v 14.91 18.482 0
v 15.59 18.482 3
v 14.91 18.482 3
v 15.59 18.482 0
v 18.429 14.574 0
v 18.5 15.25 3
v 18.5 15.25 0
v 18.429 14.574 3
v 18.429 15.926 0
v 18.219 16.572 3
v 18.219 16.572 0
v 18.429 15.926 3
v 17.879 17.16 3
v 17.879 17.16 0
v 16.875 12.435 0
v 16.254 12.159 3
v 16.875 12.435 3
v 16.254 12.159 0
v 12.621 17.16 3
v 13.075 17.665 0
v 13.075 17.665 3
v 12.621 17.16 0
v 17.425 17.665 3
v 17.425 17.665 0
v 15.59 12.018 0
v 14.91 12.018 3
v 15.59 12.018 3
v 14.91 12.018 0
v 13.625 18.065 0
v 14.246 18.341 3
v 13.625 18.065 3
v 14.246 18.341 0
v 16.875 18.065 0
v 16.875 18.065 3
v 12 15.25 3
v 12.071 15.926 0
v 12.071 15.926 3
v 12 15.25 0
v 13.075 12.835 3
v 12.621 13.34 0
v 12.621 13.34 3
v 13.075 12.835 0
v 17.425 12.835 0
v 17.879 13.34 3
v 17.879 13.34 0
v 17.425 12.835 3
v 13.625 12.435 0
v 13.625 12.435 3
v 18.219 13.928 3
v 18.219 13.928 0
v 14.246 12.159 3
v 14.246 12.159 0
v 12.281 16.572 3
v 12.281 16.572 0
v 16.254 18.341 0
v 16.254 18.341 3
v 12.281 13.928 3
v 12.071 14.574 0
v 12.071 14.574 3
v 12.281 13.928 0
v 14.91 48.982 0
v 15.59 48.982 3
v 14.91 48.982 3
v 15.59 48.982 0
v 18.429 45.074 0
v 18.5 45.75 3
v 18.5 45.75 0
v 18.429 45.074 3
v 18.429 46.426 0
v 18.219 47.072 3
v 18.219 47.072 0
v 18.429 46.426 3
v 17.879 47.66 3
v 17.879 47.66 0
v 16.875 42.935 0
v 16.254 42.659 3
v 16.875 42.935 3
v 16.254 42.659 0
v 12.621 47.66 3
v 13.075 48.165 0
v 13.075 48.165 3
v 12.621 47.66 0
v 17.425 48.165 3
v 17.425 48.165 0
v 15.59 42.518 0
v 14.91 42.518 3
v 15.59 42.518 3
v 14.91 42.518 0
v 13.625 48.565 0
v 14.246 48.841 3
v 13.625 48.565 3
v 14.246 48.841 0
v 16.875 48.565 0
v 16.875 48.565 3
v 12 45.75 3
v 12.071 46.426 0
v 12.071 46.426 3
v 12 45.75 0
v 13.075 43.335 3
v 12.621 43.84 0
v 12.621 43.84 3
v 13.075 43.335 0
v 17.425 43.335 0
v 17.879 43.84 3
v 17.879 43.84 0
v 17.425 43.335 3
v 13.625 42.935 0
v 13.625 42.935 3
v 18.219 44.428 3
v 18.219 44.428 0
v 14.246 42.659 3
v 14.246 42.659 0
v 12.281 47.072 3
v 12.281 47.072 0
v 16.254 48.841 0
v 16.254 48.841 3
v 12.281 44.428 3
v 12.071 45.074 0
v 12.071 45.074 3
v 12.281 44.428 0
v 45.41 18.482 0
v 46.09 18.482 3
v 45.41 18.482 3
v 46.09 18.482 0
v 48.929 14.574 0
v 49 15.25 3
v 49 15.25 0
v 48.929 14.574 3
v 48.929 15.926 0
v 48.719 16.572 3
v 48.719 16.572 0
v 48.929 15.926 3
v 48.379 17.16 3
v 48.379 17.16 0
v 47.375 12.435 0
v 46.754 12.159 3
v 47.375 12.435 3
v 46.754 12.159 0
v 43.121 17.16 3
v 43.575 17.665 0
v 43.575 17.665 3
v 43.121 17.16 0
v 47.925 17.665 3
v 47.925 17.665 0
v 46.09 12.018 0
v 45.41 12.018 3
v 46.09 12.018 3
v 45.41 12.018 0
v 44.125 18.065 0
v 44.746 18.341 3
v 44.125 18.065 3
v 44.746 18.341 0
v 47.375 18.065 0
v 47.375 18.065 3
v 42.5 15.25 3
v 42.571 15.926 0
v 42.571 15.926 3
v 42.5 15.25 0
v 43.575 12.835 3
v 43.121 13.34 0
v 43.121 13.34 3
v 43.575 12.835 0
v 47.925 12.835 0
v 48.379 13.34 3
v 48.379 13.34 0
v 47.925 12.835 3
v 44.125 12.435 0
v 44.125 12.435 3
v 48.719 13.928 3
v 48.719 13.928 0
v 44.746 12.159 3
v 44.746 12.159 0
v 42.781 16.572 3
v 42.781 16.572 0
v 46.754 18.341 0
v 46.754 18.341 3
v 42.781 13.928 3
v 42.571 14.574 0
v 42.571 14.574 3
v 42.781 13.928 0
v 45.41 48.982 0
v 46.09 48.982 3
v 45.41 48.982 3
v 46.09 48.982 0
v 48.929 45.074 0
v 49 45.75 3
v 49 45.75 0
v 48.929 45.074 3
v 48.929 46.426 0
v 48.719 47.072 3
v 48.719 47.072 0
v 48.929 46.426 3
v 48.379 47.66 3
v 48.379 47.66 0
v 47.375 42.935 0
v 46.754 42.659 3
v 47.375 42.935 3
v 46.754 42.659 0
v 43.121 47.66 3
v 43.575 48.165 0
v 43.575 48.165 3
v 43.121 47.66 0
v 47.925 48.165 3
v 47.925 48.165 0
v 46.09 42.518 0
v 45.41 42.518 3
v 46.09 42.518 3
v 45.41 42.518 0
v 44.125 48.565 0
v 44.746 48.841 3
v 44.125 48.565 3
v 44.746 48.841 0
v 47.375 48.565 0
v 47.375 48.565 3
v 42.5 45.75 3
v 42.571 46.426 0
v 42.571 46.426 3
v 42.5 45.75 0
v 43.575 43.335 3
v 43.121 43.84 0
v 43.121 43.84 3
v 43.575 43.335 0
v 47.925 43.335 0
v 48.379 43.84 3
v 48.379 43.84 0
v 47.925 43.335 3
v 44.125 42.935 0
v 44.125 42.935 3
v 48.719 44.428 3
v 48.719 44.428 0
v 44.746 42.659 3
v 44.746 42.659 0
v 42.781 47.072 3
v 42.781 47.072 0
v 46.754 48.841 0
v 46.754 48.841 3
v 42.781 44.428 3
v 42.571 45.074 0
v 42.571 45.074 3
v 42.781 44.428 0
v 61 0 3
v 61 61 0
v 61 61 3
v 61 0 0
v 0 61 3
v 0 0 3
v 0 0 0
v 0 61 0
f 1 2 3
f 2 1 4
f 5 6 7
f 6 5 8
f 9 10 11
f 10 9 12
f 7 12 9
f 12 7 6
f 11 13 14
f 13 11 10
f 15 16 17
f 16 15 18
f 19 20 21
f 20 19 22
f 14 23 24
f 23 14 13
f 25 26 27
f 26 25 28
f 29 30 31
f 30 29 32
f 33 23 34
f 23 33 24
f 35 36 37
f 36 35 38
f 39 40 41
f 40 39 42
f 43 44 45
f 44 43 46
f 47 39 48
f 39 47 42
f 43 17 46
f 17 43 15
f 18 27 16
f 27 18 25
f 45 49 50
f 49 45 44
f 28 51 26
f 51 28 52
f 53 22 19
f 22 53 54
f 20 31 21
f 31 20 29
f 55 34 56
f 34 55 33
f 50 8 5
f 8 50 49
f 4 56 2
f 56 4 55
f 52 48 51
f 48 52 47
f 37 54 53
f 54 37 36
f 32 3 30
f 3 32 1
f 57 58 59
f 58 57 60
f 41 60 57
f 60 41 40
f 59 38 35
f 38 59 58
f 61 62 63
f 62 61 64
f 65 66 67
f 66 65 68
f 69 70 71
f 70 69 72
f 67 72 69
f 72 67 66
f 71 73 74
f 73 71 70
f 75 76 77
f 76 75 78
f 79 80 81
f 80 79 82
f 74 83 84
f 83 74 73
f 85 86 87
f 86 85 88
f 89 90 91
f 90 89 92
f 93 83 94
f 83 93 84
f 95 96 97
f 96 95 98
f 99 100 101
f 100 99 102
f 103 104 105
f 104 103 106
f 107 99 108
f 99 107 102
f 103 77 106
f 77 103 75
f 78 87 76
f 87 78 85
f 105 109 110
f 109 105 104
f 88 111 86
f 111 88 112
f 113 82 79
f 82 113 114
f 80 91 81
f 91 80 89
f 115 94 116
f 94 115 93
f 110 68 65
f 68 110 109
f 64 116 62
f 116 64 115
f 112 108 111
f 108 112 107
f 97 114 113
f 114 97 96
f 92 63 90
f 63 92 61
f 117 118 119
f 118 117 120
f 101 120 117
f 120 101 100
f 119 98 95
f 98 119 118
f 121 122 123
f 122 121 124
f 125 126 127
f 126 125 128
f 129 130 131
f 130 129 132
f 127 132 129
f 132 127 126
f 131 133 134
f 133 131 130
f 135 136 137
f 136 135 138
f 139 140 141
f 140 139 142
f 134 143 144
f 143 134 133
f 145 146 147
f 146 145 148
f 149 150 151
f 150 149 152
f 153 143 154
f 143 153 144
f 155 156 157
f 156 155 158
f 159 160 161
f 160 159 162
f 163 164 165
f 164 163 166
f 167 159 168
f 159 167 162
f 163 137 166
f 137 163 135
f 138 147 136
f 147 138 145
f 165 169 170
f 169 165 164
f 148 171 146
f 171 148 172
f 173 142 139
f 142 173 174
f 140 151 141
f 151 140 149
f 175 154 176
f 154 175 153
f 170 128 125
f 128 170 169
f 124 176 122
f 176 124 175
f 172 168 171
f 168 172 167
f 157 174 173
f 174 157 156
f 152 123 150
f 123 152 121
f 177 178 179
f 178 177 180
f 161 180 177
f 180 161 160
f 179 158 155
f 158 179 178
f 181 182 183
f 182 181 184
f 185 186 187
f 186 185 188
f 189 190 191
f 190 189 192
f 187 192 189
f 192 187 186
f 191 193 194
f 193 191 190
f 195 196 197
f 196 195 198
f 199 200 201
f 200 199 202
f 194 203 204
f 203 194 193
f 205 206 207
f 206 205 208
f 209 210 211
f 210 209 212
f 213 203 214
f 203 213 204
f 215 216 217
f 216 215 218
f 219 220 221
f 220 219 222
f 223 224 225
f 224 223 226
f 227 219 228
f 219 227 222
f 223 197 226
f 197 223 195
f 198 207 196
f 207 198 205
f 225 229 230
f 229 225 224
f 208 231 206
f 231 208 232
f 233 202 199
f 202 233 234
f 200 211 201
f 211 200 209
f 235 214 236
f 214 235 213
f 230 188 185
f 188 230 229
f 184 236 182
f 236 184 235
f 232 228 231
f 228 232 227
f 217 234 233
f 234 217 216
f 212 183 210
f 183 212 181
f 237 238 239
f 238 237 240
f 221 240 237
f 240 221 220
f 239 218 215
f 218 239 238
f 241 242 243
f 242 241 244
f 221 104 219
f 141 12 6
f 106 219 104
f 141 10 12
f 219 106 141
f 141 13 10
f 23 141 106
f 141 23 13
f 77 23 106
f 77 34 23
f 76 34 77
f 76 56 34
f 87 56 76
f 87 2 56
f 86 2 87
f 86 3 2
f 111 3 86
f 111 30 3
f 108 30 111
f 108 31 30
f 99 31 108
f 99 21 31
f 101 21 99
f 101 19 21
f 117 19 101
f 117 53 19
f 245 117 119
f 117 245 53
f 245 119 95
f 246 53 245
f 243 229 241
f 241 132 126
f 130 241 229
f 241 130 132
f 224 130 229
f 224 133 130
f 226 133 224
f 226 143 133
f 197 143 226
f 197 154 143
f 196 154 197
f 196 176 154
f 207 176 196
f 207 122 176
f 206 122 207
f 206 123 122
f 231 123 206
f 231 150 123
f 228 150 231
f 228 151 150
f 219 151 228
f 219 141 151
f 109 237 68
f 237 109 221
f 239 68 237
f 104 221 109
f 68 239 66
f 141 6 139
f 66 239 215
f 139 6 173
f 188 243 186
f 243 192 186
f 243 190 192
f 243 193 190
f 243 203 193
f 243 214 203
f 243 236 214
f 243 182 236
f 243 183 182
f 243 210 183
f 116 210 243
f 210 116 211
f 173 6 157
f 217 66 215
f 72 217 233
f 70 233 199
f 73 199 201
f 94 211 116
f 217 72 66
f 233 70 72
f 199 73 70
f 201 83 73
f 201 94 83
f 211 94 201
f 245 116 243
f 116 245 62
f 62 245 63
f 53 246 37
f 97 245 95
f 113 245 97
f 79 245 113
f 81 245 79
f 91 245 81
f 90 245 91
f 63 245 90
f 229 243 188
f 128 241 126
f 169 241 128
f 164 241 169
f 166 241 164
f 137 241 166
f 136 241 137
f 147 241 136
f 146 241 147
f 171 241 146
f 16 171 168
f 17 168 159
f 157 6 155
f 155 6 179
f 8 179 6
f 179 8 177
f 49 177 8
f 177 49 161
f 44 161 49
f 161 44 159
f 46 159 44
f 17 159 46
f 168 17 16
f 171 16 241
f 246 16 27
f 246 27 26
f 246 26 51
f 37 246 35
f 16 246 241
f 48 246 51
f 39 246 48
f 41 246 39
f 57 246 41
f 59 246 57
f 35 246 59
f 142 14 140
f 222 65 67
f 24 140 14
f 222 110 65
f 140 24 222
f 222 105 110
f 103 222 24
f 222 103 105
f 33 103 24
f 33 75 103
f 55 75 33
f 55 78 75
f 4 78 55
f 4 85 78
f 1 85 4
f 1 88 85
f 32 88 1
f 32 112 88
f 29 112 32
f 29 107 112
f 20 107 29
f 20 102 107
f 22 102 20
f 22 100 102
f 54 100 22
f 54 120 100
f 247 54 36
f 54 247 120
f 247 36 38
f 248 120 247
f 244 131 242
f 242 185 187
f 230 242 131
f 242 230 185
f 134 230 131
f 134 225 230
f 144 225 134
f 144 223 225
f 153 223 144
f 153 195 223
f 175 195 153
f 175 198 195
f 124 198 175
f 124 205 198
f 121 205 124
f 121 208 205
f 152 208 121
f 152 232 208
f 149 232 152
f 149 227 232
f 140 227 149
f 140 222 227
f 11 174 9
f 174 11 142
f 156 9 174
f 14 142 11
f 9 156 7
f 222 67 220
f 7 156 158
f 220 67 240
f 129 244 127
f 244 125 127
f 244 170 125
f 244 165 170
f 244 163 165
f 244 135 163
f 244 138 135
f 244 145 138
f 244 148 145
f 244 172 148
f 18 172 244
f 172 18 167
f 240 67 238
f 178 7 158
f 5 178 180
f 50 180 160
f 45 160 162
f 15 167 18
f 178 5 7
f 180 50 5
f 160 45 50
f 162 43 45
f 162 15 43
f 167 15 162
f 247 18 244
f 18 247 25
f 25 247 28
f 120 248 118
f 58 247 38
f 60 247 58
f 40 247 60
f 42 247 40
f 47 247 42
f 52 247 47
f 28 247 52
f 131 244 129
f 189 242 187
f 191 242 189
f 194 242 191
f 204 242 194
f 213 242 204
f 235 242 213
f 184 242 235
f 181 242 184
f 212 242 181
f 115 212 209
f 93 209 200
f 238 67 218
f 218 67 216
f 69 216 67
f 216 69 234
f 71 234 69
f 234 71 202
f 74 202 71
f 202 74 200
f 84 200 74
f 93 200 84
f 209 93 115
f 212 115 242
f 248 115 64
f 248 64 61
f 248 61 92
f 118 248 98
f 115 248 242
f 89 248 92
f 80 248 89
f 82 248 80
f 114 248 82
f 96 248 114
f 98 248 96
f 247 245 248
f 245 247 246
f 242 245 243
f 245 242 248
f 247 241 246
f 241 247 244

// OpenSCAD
// file: ../parameters.scad
maximum_printable_size = 150;

layer_thickness = 0.3;
global_clearance = 0.5;


//Screw diameter and nut for M10 [mm]
M10_screw_diameter = 10.4;
M10_head_height = 10;
M10_head_diameter = 16+0.5;
M10_nut_height = 10.5;
M10_nut_diameter = 25.5;
M10_nut_pocket = 22.3;

//Screw diameter for M8 [mm]
M8_screw_diameter = 8.6;
M8_head_height = 8;
M8_head_diameter = 13.5;
M8_nut_height = 7.5;
M8_square_nut_thin_height = 4.5;
M8_nut_diameter = 14.4 + 0.5;
M8_nut_pocket = 13 + 0.5;
M8_washer_diameter = 16;
M8_washer_thickness = 1.5;


//Screw diameter and nut for M6 [mm]
M6_screw_diameter=6.5;
M6_head_diameter = 10+0.5;
M6_head_height = 6;
M6_nut_height = 4.9;
M6_nut_diameter = 11.8;
M6_nut_pocket = 10.4;
M6_square_nut_height = 3;
M6_square_nut_diameter = 10;
M6_washer_thickness = 1.6;

//Screw diameter and nut for M5 [mm]
M5_screw_diameter=5.5;
M5_head_height = 5;
M5_head_diameter = 13+0.5;
M5_nut_height = 4.5;
M5_nut_diameter = 9.4;
M5_nut_pocket = 8.4;

//Screw diameter and nut for M4 [mm]
M4_screw_diameter=4.5;
M4_screw_head_height = 4;
M4_nut_height = 3.2;
M4_nut_diameter = 8.4;
M4_nut_pocket = 7.5;

//Screw diameter and nut for M3 [mm]
M3_screw_diameter = 3.2;
M3_nut_height = 2.7;
M3_nut_diameter = 6.6;
M3_nut_pocket = 5.6;
M3_screw_head_height = 3;

//Screw diameter and nut for M2,5 [mm]
M2_5_screw_diameter = 2.7;
M2_5_nut_height = 2.3;
M2_5_nut_diameter = 6;
M2_5_nut_pocket = 5.5;

// kulove lozisko

bearing_efsm_08_h = 33+1;
bearing_efsm_08_m = 22;
bearing_efsm_08_db = 18;
bearing_efsm_08_ag = 10.5;
bearing_efsm_08_n = M4_screw_diameter;
bearing_efsm_08_a1 = 5.5;
bearing_efsm_08_d = 8.25;
bearing_efsm_08_B = 8; // ball height

bearing_efsm_10_h = 38+1;
bearing_efsm_10_m = 26;
bearing_efsm_10_db = 21.9;
bearing_efsm_10_ag = 12+0.2;
bearing_efsm_10_n = M5_screw_diameter;
bearing_efsm_10_a1 = 6.5;
bearing_efsm_10_d = 10.25;


bearing_efsm_12_width = 40+1;
bearing_efsm_12_h = bearing_efsm_12_width;
bearing_efsm_12_boltd = 28/2; // polovina vzdalenosti mezi srouby
bearing_efsm_12_m = bearing_efsm_12_boltd*2;
bearing_efsm_12_db = 25;
bearing_efsm_12_ag = 13;
bearing_efsm_12_a1 = 7;
bearing_efsm_12_n = M5_screw_diameter;
bearing_efsm_12_d = 12.15;
bearing_efsm_12_B = 10; // ball height
bearing_efsm_space = 1;

bearing_efsm_17_width = 54+1;
bearing_efsm_17_h = bearing_efsm_17_width;
bearing_efsm_17_boltd = 38/2; // polovina vzdalenosti mezi srouby
bearing_efsm_17_m = bearing_efsm_17_boltd*2;
bearing_efsm_17_db = 35;
bearing_efsm_17_ag = 18;
bearing_efsm_17_n = M6_screw_diameter;
bearing_efsm_17_a1 = 10;
bearing_efsm_17_B = 17; // ball height

//limcove lozisko
bearing_EFOM_10_L=26; //celkova sirka zakladny
bearing_EFOM_10_d1=10.3;//diametr otvoru real=10 mm
bearing_EFOM_10_dB=22;//diametr vystupku pro ulozeni lozika
bearing_EFOM_10_H=52;//celková delka zakladny
bearing_EFOM_10_J=36;// hole pitch
bearing_EFOM_10_A1=6.5;//vyska pouzdra
bearing_EFOM_10_Ag=12;//celkova vyska
bearing_EFOM_10_N1=5;//sirka otvoru pro sroub
bearing_EFOM_10_N2=8;//delka otvoru pro sroub
bearing_EFOM_10_m=36;//roztec der pro sroub
bearing_EFOM_10_h=9;//vyska lozika


608_bearing_outer_diameter = 22.3;
608_bearing_inner_diameter = 16;
608_bearing_thickness = 7.1;


// 20 KG servo parameters

servo_20kg_axis_offset = 9.375; // jak je osa mimo stredu
servo_20kg_body_x = 42;
servo_20kg_body_y = 21;
servo_20kg_body_z = 40;
servo_20kg_thread_x = 49/2;
servo_20kg_thread_y = 10/2;
servo_20kg_body_below = 10; // jak hluboko je tělo serva pod drzaky na srouby
servo_20kg_below = 25.8; // jak hluboko je páka serva pod drzaky na srouby

servo_20kg_bolt_d = 2.5+0.3;
servo_20kg_nut_d = 5+0.3;


//strain gauge
strain_gauge_width = 12.7;
strain_gauge_length = 75.1;
strain_gauge_screw_distance = 10;

//ALU profile
ALU_profile_width = 30.5;
ALU_profile_holder_wall_thickness = 3;
ALU_profile_groove_width = 8;

//pillow block bearing
//https://www.igus.eu/product/372
//Part no. KSTM-08
KSTM08_screws_distance = 33;         //m
KSTM08_screws_holes_diameter = 4.5;  //d2
KSTM08_flange_thickness = 6;         //h3
KSTM08_case_width = 9;               //C1
KSTM08_case_length = 47;             //a
KSTM08_ball_width = 12;              //B
KSTM08_ball_hole_diameter = 7.85;    //d1


//ložiska pro malý rotor
bearing_outer_diameter = 10.2;    // Rozměr B1 v nákresu s přídavkem na toleranci otvoru
bearing_thickness = 4;        // Rozměr B2 v nákresu
//bearing_shaft_length = 19.5;    // Rozměr B3 v nákresu, Originalni hodnota 19.5
bearing_shaft_length = 20;    // Rozměr B3 v nákresu


//simple platform parameters ////////////////////////////////////////////
front_holder_width = 160;
front_holder_angle = 25;
front_holder_height = 60;
front_holder_offset = 15;
front_holder_height_offset = 75;

// lock moving servo parameters
// static par.
servo_length = 23.1;
servo_width = 12.1;
servo_height = 26.7;
servo_axle_offset = 2.5;
servo_axle_height = 5;
servo_movement_angle = 40;
servo_movement_angle_offset = -10; // angle offset up
servo_force = 0.5; // [N/m] torque of servo

// dynamic par.
servo_arm_length = servo_width/2+ALU_profile_width/2+ALU_profile_holder_wall_thickness;
servo_travel_y = cos(servo_movement_angle)*servo_arm_length;
servo_arm_hole_length = (servo_arm_length/cos(servo_movement_angle+servo_movement_angle_offset))-servo_arm_length;
servo_joint_offset = sin(servo_movement_angle+servo_movement_angle_offset)*(servo_arm_length+servo_arm_hole_length+5);
servo_joint_offset_by_angle = -tan(servo_movement_angle_offset)*servo_arm_length;
servo_max_linear_force = servo_force/(servo_arm_length/1000); // max servo linear force [N]
servo_min_linear_force = cos(servo_movement_angle+abs(servo_movement_angle_offset))*servo_max_linear_force; // min servo linear force [N] in the most extreme position
servo_holding_linear_force = cos(servo_movement_angle+servo_movement_angle_offset)*servo_max_linear_force; // min servo linear force [N] in holding position

// lock static parameters
lock_screws_dia = 3.1;
lock_depth = 20;
lock_axle_diameter = 15;
lock_grab_axle_dia = 13;
lock_arms_joint_offset = 30;
lock_arms_joint_angle = 55;

// lock dynamic parameters
lock_push_force = (servo_holding_linear_force/cos(lock_arms_joint_angle))/cos(lock_arms_joint_angle); // lock arm pushing force on linear servo joint
lock_push_arm_length = tan(lock_arms_joint_angle)*lock_arms_joint_offset;
lock_arm_force_ratio = 1; // lock arm change holding force ratio (0.5 = arm will have half holding force)
lock_hold_arm_length = lock_push_arm_length/lock_arm_force_ratio;
lock_holding_force = lock_push_force*lock_arm_force_ratio;
lock_joint_arm_length = sqrt(pow(lock_push_arm_length, 2)+pow(lock_arms_joint_offset, 2));
// main file
include <../parameters.scad>


module 888_1010() {
	difference() {
		cube([ALU_profile_width*2, ALU_profile_width*2, 3]);

		for(i=[0:1:1]) {
			for(k=[0:1:1]) {
				translate([ALU_profile_width/2+ALU_profile_width*i, ALU_profile_width/2+ALU_profile_width*k, -1])
				cylinder(d=M6_screw_diameter, h=5, $fn=30);
			}
		}
	}
}

888_1010();
